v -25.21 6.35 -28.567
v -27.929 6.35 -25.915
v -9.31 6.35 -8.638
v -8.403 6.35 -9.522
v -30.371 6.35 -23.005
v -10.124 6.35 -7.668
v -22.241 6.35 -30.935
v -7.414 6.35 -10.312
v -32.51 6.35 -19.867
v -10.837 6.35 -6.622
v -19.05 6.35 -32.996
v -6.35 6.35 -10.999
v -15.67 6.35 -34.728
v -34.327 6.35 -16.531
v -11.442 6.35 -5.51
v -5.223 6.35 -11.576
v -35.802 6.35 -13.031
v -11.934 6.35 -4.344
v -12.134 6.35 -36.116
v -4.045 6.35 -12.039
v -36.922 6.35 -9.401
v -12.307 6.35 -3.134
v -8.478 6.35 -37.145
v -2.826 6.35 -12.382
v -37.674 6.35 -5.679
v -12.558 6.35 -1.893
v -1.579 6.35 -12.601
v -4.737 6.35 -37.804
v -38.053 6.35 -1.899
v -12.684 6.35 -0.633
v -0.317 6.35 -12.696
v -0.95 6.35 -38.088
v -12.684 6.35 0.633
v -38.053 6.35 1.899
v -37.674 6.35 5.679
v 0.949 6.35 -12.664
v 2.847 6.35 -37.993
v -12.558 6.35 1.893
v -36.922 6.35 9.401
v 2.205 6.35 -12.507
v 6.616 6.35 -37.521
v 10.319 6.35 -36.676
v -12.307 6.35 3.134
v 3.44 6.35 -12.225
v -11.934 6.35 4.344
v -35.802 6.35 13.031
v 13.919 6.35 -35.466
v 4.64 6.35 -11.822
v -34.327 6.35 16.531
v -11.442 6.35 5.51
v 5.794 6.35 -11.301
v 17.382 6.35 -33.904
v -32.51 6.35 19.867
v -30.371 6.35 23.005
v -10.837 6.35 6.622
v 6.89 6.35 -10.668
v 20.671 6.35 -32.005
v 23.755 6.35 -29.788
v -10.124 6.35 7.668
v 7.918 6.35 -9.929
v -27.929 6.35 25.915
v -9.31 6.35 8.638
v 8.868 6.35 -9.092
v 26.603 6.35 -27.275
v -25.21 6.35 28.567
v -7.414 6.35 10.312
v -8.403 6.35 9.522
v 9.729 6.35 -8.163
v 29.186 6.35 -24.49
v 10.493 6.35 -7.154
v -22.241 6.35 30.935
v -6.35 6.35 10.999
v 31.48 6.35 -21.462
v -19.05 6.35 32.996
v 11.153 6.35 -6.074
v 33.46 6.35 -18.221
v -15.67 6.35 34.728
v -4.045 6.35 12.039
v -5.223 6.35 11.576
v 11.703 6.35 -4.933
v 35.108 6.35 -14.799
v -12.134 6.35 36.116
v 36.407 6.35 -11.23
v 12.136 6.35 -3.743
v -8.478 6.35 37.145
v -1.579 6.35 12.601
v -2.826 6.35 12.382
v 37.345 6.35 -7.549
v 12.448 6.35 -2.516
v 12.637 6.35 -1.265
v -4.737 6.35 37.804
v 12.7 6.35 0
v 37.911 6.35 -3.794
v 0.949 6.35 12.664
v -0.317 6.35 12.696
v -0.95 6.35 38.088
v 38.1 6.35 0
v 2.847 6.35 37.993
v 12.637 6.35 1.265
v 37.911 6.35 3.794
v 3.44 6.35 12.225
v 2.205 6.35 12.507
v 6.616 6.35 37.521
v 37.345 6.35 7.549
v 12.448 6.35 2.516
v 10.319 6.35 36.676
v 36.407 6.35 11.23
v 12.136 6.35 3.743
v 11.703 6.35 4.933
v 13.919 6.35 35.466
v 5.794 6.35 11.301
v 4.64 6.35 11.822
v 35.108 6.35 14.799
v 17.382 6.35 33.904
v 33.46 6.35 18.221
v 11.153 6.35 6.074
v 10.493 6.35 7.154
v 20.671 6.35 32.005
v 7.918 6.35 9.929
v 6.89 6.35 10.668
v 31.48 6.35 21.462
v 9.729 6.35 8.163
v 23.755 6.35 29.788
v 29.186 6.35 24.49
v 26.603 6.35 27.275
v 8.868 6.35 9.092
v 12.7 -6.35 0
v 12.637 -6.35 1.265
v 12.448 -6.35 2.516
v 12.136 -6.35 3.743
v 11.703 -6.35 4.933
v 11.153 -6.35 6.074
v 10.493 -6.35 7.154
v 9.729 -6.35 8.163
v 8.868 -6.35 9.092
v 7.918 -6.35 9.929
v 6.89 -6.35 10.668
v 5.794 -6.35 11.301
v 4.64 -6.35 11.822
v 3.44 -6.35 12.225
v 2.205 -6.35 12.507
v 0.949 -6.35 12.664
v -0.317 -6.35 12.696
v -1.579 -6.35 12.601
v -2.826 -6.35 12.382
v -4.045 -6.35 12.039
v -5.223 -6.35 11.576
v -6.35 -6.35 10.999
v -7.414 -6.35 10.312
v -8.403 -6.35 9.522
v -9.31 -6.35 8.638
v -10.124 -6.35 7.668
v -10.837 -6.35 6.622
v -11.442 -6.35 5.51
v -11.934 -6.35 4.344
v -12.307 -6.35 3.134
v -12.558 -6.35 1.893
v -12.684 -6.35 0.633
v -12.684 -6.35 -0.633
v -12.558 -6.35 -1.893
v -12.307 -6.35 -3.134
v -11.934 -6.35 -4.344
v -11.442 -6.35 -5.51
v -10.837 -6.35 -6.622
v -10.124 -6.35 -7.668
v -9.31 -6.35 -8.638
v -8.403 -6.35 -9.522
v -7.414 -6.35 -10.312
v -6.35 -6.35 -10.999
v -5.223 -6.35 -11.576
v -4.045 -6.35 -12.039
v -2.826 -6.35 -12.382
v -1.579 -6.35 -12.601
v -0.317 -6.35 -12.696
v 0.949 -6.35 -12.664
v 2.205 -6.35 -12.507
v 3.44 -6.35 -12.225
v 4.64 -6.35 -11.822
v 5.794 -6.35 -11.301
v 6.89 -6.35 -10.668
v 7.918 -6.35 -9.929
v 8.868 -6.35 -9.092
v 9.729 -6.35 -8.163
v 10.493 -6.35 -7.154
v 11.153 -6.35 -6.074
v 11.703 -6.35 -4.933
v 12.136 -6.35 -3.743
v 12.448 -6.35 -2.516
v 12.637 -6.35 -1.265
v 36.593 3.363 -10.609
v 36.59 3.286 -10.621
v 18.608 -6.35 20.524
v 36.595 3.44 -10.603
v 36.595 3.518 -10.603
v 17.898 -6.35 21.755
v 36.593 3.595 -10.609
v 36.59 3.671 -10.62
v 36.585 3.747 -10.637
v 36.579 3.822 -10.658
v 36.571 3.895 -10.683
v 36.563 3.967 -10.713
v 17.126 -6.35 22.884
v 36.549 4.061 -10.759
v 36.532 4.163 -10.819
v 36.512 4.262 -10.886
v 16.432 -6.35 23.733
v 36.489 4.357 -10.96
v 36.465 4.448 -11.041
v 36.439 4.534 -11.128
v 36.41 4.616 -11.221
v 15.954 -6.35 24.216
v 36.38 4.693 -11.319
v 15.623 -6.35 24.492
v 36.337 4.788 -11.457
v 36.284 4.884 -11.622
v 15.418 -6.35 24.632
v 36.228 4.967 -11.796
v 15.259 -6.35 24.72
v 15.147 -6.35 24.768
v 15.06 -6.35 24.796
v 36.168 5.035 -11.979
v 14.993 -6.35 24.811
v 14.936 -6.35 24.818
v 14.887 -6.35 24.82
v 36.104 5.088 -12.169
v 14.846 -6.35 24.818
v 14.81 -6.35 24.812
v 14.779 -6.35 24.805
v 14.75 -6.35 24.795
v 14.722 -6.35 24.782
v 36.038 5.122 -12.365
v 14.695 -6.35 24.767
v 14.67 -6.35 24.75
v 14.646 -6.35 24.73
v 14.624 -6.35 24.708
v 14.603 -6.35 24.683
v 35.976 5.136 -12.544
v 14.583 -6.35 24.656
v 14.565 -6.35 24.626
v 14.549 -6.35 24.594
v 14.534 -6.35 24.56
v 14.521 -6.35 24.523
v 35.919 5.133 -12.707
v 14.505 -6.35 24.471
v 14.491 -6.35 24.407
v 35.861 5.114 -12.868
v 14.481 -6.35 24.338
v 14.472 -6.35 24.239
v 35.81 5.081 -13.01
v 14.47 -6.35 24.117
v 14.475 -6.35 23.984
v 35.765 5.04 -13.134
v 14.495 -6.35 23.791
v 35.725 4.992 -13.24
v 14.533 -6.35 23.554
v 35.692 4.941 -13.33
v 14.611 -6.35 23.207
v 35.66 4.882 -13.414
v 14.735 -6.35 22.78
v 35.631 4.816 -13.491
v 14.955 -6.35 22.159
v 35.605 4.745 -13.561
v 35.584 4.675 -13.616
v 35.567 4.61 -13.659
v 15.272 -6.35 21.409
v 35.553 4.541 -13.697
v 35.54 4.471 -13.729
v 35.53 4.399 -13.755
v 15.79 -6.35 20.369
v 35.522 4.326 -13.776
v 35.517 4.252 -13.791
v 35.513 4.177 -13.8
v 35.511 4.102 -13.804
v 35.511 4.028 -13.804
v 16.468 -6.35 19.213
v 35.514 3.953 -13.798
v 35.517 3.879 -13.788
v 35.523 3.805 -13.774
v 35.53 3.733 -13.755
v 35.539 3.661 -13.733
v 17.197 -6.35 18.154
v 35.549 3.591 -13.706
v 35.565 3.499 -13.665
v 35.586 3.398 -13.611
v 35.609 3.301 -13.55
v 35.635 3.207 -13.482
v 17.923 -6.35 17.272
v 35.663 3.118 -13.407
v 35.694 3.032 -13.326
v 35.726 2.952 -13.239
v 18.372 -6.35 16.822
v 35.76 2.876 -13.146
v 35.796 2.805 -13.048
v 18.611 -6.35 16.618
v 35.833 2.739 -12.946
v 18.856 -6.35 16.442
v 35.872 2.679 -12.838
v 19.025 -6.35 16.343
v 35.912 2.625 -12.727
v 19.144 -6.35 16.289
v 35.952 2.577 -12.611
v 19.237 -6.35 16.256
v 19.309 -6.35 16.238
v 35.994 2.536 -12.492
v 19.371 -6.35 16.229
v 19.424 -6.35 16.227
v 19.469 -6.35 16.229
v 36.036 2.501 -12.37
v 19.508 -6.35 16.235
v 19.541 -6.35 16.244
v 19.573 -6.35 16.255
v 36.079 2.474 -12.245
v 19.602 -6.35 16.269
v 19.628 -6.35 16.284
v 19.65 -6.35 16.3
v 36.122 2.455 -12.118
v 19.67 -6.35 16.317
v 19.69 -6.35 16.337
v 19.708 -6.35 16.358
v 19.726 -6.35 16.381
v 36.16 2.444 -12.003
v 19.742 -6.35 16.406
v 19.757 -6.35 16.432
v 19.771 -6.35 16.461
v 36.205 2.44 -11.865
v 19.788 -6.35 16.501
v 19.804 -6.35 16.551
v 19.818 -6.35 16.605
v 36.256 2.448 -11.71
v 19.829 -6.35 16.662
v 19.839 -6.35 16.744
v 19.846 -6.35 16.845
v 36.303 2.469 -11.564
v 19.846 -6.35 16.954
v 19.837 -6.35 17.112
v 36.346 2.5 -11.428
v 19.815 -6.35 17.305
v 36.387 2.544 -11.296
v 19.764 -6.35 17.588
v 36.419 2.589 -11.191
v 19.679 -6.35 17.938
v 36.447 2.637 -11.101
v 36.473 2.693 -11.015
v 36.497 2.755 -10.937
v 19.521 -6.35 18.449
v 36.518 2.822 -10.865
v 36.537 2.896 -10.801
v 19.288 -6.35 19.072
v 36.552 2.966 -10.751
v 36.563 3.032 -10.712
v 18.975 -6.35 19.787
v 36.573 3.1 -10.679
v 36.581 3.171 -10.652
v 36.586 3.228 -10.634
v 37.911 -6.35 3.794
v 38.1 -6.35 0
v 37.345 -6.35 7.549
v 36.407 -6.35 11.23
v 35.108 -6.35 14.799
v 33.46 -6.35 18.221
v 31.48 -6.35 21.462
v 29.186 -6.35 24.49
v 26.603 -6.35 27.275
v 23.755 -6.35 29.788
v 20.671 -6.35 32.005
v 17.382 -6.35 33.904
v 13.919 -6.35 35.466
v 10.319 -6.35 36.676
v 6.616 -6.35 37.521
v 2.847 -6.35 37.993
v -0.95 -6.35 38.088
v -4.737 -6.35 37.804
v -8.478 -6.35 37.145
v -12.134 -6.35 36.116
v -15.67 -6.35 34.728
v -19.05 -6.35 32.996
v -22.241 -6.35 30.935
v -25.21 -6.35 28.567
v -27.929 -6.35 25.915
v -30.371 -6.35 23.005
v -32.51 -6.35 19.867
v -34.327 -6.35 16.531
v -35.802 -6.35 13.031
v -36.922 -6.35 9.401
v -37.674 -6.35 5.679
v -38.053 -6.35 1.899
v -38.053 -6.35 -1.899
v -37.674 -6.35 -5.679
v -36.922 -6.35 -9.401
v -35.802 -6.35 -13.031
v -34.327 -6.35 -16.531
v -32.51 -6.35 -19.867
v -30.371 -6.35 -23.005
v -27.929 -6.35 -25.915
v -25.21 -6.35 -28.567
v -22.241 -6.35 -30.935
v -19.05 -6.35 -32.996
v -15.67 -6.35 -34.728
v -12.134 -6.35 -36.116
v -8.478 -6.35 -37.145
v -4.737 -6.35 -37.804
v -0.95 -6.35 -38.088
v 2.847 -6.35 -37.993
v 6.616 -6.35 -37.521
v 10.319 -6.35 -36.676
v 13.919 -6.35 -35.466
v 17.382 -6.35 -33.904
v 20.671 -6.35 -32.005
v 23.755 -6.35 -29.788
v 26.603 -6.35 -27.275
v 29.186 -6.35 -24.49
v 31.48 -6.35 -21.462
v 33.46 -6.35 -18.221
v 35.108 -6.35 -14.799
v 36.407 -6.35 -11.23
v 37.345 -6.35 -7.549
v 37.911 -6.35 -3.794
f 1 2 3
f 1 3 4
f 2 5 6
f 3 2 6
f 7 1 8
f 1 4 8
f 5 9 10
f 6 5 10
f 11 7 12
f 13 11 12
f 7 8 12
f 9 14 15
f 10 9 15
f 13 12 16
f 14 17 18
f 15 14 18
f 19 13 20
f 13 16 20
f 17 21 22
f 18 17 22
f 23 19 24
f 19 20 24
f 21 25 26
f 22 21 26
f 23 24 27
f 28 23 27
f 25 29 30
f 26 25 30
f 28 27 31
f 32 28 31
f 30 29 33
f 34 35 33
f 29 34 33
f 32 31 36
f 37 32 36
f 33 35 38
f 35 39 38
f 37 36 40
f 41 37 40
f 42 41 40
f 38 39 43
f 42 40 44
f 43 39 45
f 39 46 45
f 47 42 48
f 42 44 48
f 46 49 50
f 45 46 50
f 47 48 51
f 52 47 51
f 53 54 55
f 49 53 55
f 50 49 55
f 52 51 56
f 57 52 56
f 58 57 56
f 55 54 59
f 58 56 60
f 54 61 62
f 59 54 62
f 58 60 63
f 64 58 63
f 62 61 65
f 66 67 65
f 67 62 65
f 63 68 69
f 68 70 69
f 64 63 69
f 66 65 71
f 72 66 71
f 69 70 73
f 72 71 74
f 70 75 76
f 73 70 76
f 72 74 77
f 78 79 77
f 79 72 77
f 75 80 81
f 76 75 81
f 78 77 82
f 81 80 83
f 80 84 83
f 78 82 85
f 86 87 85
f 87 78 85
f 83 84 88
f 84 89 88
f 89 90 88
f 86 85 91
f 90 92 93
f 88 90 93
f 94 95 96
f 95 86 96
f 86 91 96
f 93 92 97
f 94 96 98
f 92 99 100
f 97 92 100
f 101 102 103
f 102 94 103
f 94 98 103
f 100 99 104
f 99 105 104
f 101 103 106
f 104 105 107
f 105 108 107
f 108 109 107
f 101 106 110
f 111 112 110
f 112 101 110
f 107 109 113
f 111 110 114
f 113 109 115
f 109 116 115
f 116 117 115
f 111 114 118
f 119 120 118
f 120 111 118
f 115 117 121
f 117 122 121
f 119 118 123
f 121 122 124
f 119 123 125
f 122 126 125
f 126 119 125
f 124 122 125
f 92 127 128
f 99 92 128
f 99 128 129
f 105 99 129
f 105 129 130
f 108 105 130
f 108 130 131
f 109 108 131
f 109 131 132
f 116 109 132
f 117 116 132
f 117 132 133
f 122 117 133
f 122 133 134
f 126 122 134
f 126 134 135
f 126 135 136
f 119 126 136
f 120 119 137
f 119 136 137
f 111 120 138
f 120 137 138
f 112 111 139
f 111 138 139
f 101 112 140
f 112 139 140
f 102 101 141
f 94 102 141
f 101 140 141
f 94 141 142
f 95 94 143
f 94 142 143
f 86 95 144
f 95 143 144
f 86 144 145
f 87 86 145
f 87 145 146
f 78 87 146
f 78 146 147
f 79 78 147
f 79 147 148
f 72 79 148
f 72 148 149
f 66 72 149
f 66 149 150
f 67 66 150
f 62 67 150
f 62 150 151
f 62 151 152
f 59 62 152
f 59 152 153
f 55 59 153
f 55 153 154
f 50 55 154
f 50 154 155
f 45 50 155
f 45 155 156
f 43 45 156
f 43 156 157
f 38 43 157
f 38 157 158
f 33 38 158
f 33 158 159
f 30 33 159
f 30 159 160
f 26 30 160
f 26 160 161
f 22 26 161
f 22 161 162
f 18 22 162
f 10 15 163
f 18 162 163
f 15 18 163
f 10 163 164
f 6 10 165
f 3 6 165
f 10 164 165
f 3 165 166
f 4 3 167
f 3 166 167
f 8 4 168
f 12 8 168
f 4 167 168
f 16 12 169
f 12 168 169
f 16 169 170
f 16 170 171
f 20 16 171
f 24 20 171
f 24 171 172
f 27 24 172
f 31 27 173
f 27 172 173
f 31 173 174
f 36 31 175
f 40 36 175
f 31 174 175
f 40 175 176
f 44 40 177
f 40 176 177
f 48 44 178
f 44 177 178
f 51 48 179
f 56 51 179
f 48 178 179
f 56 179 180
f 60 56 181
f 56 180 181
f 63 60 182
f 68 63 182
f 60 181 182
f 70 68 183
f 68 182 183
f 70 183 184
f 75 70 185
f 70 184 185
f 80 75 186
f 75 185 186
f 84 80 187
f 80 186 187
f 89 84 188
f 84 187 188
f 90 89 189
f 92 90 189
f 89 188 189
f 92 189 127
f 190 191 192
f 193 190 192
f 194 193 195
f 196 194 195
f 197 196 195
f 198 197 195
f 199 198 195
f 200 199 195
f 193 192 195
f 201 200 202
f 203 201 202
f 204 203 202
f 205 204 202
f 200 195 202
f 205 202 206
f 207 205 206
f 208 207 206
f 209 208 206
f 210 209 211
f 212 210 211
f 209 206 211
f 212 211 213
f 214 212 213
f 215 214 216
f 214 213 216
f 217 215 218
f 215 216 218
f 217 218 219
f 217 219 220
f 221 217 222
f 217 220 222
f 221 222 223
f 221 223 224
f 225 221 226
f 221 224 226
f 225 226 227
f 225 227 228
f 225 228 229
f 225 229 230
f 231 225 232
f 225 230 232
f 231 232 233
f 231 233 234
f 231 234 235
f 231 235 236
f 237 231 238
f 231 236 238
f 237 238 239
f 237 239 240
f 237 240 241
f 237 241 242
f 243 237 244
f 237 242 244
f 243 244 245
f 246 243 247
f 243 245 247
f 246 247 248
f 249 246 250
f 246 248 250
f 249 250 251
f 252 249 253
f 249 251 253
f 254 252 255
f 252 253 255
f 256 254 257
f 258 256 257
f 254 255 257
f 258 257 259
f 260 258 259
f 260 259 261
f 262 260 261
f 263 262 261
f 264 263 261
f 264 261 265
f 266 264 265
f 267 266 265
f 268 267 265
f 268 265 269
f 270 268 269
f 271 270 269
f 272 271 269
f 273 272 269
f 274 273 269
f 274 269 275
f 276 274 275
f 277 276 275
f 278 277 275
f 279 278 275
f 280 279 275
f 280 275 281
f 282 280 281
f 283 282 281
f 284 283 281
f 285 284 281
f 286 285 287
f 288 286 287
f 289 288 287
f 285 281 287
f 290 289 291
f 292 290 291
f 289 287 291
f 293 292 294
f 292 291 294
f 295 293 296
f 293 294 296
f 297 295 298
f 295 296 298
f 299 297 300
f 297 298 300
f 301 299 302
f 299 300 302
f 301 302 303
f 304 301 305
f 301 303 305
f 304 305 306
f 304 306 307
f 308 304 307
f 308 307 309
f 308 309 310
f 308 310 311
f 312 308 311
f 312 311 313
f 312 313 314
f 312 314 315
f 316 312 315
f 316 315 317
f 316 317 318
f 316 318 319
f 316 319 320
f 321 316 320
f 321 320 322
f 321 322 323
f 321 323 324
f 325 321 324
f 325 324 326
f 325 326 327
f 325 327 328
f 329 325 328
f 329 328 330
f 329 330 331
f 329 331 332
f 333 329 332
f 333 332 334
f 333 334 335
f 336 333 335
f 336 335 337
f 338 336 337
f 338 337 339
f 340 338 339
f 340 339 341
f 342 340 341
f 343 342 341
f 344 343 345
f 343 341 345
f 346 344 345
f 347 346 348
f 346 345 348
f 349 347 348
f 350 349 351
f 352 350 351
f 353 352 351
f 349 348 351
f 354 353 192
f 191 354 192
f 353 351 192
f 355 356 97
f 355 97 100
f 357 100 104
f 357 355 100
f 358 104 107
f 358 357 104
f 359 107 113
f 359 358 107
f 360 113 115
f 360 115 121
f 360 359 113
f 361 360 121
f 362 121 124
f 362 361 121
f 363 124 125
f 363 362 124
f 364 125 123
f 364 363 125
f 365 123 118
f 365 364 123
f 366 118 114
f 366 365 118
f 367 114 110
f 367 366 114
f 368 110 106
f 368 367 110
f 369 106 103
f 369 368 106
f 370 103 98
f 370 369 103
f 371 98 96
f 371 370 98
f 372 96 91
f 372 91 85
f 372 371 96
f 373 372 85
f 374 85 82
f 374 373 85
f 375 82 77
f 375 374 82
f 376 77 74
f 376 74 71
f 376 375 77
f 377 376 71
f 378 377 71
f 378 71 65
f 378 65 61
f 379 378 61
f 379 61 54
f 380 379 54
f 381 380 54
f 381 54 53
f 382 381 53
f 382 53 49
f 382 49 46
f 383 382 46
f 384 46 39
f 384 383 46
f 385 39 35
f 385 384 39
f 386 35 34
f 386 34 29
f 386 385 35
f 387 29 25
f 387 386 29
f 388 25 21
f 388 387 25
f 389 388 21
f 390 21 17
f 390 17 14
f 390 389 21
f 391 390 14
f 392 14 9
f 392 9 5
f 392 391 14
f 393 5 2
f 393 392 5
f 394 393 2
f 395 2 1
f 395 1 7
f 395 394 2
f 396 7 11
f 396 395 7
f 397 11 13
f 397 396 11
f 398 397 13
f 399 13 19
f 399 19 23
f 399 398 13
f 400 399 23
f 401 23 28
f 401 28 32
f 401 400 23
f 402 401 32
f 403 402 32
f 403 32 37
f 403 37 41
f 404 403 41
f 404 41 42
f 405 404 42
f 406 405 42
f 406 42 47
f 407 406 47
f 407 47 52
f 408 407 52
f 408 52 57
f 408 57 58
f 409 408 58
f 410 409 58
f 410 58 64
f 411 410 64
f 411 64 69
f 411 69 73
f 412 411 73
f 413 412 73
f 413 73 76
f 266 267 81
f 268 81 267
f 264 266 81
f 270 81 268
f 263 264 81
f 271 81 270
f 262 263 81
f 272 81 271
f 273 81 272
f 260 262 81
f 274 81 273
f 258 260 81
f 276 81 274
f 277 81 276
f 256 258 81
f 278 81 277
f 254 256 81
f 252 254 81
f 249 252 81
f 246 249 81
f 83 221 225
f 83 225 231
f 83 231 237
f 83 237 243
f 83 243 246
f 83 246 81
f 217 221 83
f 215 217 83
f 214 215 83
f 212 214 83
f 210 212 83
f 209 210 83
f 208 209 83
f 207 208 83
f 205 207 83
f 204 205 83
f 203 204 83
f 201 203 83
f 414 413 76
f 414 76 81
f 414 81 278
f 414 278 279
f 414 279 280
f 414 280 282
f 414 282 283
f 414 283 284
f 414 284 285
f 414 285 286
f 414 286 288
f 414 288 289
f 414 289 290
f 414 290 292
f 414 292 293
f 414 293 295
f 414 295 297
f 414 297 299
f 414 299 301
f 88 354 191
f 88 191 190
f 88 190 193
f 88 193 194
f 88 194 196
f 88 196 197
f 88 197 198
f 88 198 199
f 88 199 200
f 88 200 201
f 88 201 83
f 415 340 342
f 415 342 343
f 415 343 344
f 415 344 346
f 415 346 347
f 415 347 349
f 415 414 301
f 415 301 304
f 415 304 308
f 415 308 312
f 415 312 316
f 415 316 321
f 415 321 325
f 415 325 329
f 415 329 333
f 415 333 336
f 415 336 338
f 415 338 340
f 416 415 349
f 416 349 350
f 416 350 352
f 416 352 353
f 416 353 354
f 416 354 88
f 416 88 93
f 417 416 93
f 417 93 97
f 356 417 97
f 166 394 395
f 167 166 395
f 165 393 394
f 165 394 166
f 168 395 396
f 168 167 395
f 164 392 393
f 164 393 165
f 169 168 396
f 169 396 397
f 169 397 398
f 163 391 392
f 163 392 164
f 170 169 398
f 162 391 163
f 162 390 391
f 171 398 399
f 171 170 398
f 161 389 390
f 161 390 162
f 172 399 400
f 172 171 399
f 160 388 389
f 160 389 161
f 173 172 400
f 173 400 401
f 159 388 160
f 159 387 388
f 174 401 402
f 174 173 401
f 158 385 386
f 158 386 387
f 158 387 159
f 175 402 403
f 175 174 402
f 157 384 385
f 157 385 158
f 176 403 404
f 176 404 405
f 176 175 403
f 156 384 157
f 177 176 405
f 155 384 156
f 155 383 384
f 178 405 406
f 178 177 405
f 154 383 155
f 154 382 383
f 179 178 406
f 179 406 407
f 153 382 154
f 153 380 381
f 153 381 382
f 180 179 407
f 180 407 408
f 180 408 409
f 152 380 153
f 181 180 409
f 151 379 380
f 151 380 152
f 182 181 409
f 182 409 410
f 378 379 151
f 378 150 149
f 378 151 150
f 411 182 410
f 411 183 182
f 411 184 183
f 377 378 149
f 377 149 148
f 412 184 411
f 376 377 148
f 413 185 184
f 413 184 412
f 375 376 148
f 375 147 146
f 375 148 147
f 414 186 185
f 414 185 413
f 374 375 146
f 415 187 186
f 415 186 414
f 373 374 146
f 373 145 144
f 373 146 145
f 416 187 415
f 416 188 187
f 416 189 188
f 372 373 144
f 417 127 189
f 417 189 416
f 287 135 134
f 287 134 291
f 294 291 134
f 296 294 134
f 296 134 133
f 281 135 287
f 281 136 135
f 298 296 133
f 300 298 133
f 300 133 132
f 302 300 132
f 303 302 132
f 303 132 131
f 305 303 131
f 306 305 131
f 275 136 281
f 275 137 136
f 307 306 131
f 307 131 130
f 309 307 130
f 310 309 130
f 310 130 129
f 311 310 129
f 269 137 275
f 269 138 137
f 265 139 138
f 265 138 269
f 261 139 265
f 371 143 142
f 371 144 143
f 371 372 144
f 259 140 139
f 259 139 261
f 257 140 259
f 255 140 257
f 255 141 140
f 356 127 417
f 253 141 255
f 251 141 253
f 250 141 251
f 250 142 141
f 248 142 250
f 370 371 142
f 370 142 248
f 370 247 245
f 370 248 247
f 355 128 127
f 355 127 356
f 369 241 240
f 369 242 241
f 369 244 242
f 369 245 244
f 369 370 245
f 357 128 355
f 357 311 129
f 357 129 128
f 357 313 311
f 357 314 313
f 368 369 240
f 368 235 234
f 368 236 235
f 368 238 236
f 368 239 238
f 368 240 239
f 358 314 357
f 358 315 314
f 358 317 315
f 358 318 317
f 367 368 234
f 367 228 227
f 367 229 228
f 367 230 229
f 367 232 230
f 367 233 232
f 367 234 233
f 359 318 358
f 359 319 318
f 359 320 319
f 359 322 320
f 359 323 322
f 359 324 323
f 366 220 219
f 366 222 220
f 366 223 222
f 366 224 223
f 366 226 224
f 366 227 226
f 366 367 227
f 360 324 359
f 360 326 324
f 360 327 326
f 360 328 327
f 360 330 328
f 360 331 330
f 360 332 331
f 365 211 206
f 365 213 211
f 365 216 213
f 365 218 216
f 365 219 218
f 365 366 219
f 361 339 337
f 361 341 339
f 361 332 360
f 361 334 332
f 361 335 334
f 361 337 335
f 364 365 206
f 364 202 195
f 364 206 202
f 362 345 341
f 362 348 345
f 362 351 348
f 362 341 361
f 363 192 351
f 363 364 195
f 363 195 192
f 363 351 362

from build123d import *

# Parameters (mm, degrees)
F0_R          = 38.1
F1_DEPTH      = 6.35
F2_R          = 12.7
F3_DEPTH      = 25.4
F8_R          = 1.27
F9_DEPTH      = 51.9166590996
F9_DEPTH_BACK = 51.9166590996


with BuildPart() as f1:
    # F0 (on Front) → F1 (new body, symmetric)
    with BuildSketch(Plane.XZ):
        Circle(F0_R)
    extrude(amount=F1_DEPTH, both=True)

    # F2 (on face) → F3 (cut)
    with BuildSketch(Plane.XZ.offset(6.35)):
        Circle(F2_R)
    extrude(amount=-F3_DEPTH, mode=Mode.SUBTRACT)

    # F8 (on face) → F9 (cut, two sides)
    with BuildSketch(Plane(origin=(0, 0, 0), x_dir=(0.8756408079, -0.1427525977, 0.4613836487), z_dir=(-0.4829629131, -0.2588190451, 0.8365163037))) as f9_sk:
        with Locations((25.4, 0)):
            Circle(F8_R)
    extrude(amount=-F9_DEPTH, mode=Mode.SUBTRACT)
    extrude(f9_sk.sketch, amount=F9_DEPTH_BACK, mode=Mode.SUBTRACT)


solid = f1.part
